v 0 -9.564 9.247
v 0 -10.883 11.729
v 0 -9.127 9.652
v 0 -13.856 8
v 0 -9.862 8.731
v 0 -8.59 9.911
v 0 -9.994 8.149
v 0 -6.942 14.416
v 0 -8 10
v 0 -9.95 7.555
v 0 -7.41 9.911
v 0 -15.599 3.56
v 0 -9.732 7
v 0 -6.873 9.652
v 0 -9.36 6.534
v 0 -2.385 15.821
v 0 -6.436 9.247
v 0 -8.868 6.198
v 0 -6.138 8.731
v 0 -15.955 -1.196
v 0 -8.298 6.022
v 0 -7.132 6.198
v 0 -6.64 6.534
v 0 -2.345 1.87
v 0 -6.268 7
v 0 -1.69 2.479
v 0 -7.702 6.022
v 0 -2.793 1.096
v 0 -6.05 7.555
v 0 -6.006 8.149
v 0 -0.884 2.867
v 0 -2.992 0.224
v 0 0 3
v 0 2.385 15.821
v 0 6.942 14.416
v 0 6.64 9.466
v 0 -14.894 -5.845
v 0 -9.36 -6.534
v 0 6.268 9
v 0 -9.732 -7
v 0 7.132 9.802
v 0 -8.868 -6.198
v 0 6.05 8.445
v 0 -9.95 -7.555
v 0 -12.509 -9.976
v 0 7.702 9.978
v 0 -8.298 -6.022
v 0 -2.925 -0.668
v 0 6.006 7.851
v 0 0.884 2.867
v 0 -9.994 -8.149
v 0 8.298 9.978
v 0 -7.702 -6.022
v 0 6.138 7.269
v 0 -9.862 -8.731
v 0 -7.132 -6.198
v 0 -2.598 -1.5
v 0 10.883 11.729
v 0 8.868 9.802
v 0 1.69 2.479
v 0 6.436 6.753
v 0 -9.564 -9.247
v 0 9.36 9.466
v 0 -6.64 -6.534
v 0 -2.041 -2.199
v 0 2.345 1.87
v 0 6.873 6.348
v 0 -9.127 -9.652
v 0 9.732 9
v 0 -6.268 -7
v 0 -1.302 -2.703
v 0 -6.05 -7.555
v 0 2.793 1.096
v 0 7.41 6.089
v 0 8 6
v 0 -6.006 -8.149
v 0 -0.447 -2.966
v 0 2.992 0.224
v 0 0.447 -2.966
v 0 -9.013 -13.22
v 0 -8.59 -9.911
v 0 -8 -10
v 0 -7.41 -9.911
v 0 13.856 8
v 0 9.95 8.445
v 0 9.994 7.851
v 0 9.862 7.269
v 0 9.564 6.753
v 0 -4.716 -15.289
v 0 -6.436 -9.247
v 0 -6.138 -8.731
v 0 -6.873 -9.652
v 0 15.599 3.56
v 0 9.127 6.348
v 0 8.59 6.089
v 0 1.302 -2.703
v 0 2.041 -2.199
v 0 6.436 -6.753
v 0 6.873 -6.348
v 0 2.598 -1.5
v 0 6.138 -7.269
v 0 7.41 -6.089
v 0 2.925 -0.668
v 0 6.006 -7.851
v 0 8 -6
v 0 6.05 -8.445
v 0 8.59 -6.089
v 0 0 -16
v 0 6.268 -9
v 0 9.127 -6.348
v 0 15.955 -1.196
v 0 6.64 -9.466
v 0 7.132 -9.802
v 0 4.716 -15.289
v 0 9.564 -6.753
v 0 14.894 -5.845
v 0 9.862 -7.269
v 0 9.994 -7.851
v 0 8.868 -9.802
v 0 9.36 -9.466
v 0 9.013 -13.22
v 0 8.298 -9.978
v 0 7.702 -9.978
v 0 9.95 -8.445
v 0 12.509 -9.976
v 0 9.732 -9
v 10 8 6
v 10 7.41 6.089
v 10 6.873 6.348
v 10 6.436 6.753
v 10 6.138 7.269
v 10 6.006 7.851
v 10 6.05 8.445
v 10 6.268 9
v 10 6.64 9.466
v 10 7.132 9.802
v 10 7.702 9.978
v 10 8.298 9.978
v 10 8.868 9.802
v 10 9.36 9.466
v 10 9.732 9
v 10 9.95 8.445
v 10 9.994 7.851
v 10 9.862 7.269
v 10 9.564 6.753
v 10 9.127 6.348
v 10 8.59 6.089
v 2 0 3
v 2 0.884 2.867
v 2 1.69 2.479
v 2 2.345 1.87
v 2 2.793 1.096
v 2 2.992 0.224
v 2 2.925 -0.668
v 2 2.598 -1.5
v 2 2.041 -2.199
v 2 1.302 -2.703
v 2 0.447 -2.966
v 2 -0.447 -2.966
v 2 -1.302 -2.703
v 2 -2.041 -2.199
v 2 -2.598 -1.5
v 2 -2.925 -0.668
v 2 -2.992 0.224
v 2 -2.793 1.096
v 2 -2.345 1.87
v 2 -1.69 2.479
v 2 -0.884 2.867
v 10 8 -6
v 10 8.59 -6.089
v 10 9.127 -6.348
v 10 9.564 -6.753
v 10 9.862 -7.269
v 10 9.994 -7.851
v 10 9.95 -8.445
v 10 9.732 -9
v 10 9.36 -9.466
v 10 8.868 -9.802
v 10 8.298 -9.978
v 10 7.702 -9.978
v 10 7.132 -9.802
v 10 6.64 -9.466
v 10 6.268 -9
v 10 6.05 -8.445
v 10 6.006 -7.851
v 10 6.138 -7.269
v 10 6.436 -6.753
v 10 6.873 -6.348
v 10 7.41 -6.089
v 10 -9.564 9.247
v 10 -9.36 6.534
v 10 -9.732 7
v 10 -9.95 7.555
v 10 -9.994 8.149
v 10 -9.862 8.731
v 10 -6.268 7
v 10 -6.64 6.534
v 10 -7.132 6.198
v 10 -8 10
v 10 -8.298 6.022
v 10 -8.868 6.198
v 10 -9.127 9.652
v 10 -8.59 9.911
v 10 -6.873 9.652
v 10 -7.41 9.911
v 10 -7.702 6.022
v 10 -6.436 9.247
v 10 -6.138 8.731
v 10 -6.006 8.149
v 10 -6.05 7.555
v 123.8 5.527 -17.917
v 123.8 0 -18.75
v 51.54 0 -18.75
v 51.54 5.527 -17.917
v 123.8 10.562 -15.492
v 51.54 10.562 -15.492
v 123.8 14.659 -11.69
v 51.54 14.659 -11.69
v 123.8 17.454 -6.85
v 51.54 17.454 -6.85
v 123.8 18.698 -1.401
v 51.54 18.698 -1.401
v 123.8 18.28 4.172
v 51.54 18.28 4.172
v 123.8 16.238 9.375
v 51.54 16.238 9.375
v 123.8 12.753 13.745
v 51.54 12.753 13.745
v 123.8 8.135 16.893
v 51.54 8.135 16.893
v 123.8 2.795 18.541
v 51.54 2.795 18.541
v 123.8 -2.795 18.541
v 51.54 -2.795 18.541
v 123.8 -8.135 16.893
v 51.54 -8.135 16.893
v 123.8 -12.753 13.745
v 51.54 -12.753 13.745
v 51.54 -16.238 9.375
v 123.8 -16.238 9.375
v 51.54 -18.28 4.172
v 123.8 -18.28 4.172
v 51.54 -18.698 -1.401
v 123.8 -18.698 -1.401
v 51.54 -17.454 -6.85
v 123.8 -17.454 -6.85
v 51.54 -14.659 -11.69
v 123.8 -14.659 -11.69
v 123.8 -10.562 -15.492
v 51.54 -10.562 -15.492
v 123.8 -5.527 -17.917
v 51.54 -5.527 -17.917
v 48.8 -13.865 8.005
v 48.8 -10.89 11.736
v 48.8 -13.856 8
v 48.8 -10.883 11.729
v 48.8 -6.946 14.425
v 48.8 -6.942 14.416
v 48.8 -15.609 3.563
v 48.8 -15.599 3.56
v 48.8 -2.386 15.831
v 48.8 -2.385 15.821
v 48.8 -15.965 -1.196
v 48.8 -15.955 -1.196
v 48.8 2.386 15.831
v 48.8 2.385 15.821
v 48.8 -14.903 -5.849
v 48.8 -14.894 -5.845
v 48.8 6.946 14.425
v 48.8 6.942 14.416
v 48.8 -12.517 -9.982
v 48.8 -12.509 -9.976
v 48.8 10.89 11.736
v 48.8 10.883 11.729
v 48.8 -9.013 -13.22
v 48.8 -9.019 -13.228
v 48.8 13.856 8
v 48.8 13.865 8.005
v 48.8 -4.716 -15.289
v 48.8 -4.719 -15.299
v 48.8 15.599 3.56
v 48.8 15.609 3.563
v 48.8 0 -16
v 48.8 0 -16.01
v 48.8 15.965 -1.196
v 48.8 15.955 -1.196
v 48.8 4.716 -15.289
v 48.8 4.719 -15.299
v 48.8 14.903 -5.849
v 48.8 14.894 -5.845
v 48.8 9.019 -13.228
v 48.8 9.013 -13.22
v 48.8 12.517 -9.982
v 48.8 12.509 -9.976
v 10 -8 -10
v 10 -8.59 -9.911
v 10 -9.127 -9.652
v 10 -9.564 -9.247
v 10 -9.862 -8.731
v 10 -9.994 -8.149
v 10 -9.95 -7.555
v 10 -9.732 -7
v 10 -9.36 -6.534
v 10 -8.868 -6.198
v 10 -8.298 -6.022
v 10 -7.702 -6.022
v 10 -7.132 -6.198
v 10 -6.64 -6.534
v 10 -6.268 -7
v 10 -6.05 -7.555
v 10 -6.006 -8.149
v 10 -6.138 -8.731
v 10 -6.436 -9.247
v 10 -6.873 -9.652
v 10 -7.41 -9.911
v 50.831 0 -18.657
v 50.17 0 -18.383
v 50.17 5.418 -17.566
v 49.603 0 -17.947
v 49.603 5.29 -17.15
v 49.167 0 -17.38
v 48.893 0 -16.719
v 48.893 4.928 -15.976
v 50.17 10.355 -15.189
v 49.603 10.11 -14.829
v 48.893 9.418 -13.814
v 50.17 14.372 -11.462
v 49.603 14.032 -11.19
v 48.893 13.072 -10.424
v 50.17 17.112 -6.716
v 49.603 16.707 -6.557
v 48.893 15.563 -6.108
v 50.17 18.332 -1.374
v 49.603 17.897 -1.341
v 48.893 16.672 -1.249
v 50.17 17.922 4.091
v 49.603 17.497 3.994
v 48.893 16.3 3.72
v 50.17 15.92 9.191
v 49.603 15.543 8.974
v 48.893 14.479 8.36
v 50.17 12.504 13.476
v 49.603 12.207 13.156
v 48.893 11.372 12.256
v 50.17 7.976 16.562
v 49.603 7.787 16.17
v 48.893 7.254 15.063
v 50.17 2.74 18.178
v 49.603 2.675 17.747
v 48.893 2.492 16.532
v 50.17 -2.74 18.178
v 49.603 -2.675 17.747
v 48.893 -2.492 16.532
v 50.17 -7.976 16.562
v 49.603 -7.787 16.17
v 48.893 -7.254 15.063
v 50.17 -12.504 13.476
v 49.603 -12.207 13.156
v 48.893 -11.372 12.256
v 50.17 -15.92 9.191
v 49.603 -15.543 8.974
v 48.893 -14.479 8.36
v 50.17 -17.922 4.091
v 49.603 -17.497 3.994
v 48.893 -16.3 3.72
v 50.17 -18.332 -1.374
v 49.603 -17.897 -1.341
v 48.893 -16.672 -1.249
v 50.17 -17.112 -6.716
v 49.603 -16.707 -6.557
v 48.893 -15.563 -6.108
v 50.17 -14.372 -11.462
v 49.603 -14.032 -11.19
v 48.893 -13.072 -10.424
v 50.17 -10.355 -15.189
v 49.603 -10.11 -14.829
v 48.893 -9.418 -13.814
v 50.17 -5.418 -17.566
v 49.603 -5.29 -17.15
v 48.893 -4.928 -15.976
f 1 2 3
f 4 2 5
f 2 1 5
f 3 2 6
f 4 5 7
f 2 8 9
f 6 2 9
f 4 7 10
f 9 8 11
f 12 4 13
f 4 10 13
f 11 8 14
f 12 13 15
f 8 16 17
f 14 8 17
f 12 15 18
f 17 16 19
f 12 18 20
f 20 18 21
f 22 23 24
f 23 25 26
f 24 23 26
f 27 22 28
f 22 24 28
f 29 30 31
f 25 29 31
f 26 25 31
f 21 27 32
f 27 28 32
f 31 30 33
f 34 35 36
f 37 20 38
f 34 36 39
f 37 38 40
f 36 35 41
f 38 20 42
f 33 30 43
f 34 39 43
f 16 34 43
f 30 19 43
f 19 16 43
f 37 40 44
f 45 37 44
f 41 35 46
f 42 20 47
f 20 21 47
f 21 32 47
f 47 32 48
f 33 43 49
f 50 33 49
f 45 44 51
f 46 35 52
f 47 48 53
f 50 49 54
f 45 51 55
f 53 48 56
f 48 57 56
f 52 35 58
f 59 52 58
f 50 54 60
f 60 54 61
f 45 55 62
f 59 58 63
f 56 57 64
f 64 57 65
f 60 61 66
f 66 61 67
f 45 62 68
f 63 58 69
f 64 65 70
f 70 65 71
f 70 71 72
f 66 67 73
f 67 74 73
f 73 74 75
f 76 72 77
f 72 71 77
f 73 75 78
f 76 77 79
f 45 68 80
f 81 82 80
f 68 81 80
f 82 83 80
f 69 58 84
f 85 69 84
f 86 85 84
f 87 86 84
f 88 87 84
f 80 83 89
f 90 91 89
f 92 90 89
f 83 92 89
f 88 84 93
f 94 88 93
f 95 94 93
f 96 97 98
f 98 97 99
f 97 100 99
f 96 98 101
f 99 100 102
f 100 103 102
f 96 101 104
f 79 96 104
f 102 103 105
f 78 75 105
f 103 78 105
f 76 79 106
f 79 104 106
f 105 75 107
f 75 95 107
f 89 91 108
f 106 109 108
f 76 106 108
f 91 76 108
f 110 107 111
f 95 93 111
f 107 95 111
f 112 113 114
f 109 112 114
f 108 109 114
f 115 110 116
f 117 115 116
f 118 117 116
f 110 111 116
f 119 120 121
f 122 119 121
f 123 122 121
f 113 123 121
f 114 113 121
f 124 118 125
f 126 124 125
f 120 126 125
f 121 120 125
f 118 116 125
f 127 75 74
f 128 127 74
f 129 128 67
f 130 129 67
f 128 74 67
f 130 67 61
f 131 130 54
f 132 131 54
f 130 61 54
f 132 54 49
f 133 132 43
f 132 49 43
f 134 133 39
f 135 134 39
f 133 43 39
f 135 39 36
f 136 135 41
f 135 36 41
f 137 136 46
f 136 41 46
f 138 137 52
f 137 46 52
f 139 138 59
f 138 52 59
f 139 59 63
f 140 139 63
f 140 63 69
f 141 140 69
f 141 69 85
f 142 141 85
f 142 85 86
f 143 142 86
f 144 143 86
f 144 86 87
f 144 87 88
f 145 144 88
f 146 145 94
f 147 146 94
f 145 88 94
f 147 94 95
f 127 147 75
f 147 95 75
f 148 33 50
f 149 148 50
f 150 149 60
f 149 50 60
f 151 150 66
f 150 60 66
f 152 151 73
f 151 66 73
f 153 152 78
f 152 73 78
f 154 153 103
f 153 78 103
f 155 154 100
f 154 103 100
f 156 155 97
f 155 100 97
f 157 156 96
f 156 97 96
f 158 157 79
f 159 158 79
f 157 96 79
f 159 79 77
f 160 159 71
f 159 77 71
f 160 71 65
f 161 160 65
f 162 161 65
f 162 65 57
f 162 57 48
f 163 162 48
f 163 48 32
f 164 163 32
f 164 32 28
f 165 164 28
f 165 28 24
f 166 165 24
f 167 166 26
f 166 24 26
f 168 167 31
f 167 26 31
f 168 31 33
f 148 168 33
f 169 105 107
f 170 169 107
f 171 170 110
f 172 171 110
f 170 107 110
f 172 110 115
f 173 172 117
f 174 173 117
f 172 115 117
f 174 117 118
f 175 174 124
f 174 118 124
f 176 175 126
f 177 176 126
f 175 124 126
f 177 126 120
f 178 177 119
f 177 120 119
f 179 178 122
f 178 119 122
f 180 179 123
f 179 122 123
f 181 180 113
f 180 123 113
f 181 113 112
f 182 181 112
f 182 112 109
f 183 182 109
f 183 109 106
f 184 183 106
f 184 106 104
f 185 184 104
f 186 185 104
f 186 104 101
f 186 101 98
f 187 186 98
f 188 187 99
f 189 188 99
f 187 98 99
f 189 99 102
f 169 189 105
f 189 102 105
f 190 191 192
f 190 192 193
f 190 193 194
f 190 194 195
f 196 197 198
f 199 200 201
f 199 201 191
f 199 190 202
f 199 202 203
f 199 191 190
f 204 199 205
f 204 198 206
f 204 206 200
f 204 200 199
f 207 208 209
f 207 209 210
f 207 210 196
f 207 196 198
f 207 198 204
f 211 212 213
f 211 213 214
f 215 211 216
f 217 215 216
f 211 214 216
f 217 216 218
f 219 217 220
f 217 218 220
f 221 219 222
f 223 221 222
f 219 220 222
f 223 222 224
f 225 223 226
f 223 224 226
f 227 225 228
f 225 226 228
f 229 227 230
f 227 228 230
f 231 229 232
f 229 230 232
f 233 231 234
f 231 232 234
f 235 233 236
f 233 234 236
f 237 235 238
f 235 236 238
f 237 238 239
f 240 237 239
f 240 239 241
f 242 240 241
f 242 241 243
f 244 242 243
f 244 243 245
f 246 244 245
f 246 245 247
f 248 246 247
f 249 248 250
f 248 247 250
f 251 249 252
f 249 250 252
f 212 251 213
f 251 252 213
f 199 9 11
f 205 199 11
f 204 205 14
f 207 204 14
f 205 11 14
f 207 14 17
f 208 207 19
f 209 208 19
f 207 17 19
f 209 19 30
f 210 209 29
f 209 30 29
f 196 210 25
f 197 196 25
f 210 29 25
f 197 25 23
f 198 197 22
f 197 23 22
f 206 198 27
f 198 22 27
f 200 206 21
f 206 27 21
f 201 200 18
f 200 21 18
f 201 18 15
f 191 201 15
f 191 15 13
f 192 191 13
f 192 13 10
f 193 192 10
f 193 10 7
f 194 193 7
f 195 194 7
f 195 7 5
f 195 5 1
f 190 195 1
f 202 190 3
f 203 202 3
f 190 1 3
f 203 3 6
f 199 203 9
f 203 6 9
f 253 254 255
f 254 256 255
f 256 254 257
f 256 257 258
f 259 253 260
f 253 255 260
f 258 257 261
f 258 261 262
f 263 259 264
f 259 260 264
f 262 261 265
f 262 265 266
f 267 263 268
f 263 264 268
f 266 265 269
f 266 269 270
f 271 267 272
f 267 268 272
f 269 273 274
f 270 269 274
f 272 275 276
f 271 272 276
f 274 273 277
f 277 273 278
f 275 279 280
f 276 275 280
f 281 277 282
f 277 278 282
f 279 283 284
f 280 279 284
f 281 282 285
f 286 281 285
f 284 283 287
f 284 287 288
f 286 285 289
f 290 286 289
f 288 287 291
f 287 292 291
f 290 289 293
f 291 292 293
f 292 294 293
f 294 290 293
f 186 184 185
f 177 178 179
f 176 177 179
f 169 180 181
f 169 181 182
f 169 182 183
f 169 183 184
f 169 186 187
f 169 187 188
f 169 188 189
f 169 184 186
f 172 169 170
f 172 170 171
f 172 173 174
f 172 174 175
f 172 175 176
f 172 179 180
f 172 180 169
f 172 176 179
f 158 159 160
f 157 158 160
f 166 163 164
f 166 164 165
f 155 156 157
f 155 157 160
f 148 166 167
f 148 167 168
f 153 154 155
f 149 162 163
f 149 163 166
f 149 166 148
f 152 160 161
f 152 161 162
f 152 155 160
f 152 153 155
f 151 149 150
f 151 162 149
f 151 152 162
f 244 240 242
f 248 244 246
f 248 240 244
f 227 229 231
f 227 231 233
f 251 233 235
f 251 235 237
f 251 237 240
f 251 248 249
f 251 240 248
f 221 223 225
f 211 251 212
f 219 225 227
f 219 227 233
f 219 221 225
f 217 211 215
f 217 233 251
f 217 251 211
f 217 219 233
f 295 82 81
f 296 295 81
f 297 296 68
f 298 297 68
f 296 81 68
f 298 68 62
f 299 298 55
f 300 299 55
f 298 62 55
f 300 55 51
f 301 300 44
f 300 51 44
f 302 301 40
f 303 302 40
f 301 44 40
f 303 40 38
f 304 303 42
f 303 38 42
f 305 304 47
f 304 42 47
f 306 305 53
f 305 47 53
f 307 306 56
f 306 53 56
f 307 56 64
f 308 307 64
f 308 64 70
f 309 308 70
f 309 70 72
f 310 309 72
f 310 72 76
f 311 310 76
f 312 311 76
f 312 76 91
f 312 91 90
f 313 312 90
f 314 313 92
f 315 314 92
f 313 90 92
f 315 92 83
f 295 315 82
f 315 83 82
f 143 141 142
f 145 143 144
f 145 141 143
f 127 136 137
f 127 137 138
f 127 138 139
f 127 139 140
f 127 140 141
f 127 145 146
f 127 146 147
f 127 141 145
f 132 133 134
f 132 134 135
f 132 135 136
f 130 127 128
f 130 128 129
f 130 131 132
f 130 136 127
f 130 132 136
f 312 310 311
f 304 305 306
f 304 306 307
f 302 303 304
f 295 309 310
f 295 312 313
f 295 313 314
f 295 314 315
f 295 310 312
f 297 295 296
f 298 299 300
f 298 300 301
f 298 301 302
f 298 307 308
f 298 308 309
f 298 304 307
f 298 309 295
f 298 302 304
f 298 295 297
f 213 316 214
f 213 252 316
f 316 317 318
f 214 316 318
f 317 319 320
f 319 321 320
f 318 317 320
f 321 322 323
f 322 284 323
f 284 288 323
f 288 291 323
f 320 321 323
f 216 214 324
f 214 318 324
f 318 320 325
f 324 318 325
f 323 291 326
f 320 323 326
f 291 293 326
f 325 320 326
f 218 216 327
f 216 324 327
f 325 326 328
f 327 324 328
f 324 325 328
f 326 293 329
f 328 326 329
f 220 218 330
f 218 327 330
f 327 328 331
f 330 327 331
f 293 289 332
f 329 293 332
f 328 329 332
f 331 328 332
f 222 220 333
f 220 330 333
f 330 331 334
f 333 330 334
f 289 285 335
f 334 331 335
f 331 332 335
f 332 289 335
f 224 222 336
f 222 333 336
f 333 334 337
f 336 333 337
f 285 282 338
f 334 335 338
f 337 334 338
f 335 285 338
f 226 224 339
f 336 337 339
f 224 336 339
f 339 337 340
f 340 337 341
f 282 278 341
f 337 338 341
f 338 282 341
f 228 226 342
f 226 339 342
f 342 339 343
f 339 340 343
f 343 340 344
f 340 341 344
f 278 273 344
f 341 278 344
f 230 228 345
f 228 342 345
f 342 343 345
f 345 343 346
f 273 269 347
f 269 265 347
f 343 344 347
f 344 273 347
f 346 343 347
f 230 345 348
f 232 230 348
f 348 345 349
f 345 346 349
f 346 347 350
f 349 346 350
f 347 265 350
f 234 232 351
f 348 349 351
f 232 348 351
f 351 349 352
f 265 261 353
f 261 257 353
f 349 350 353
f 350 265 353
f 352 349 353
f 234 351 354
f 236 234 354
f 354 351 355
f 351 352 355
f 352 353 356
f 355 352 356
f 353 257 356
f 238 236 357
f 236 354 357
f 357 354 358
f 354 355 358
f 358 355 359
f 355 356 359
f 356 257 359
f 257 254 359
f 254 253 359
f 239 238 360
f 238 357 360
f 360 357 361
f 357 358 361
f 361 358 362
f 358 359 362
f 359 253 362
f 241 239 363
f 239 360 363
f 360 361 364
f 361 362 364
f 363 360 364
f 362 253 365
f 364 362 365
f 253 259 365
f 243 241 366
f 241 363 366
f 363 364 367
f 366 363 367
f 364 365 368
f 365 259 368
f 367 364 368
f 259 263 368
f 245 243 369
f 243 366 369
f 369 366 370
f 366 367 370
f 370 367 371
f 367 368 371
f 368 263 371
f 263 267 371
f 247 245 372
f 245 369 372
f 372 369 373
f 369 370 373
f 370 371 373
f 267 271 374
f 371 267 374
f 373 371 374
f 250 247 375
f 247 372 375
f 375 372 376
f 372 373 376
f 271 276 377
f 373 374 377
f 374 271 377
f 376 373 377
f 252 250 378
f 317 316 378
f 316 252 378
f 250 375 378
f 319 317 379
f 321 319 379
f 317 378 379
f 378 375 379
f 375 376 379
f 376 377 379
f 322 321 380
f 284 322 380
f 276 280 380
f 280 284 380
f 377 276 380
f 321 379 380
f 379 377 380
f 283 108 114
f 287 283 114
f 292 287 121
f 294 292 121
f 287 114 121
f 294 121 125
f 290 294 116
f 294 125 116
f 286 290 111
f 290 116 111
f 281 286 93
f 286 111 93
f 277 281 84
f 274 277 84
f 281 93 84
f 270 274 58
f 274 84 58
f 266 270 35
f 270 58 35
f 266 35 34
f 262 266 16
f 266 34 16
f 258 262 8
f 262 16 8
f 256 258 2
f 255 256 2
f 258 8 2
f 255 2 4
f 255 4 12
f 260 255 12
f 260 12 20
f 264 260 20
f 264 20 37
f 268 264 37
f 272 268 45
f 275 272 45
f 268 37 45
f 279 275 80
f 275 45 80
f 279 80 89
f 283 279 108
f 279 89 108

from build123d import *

# Parameters (mm, degrees)
SKETCH2_R           = 16
BOSS_EXTRUDE1_DEPTH = 48.8
SKETCH3_R           = 18.75
BOSS_EXTRUDE2_DEPTH = 75
FILLET1_R           = 2.74
SKETCH4_R           = 3
CUT_EXTRUDE1_DEPTH  = 2
SKETCH5_R           = 2
CUT_EXTRUDE2_DEPTH  = 10


with BuildPart() as part:
    # Sketch2 → Boss-Extrude1 (new body)
    with BuildSketch(Plane(origin=(0, 0, 0), x_dir=(0, 0, -1), z_dir=(1, 0, 0))):
        Circle(SKETCH2_R)
    extrude(amount=BOSS_EXTRUDE1_DEPTH)

    # Sketch3 → Boss-Extrude2 (add)
    with BuildSketch(Plane(origin=(48.8, 0, 0), x_dir=(0, 0, -1), z_dir=(1, 0, 0))):
        Circle(SKETCH3_R)
    extrude(amount=BOSS_EXTRUDE2_DEPTH)

    # Fillet1
    fillet1_edges = [part.edges().sort_by_distance(p)[0] for p in [
        (48.8, 0, 18.75),
    ]]
    fillet(fillet1_edges, radius=FILLET1_R)

    # Sketch4 → Cut-Extrude1 (cut)
    with BuildSketch(Plane.ZY):
        Circle(SKETCH4_R)
    extrude(amount=-CUT_EXTRUDE1_DEPTH, mode=Mode.SUBTRACT)

    # Sketch5 → Cut-Extrude2 (cut)
    with BuildSketch(Plane.ZY):
        with Locations((-8, 8)):
            Circle(SKETCH5_R)
        with Locations(Location((8, 8, 0), (0, 0, 180))):
            Circle(SKETCH5_R)
        with Locations((8, -8)):
            Circle(SKETCH5_R)
        with Locations(Location((-8, -8, 0), (0, 0, 180))):
            Circle(SKETCH5_R)
    extrude(amount=-CUT_EXTRUDE2_DEPTH, mode=Mode.SUBTRACT)


solid = part.part
